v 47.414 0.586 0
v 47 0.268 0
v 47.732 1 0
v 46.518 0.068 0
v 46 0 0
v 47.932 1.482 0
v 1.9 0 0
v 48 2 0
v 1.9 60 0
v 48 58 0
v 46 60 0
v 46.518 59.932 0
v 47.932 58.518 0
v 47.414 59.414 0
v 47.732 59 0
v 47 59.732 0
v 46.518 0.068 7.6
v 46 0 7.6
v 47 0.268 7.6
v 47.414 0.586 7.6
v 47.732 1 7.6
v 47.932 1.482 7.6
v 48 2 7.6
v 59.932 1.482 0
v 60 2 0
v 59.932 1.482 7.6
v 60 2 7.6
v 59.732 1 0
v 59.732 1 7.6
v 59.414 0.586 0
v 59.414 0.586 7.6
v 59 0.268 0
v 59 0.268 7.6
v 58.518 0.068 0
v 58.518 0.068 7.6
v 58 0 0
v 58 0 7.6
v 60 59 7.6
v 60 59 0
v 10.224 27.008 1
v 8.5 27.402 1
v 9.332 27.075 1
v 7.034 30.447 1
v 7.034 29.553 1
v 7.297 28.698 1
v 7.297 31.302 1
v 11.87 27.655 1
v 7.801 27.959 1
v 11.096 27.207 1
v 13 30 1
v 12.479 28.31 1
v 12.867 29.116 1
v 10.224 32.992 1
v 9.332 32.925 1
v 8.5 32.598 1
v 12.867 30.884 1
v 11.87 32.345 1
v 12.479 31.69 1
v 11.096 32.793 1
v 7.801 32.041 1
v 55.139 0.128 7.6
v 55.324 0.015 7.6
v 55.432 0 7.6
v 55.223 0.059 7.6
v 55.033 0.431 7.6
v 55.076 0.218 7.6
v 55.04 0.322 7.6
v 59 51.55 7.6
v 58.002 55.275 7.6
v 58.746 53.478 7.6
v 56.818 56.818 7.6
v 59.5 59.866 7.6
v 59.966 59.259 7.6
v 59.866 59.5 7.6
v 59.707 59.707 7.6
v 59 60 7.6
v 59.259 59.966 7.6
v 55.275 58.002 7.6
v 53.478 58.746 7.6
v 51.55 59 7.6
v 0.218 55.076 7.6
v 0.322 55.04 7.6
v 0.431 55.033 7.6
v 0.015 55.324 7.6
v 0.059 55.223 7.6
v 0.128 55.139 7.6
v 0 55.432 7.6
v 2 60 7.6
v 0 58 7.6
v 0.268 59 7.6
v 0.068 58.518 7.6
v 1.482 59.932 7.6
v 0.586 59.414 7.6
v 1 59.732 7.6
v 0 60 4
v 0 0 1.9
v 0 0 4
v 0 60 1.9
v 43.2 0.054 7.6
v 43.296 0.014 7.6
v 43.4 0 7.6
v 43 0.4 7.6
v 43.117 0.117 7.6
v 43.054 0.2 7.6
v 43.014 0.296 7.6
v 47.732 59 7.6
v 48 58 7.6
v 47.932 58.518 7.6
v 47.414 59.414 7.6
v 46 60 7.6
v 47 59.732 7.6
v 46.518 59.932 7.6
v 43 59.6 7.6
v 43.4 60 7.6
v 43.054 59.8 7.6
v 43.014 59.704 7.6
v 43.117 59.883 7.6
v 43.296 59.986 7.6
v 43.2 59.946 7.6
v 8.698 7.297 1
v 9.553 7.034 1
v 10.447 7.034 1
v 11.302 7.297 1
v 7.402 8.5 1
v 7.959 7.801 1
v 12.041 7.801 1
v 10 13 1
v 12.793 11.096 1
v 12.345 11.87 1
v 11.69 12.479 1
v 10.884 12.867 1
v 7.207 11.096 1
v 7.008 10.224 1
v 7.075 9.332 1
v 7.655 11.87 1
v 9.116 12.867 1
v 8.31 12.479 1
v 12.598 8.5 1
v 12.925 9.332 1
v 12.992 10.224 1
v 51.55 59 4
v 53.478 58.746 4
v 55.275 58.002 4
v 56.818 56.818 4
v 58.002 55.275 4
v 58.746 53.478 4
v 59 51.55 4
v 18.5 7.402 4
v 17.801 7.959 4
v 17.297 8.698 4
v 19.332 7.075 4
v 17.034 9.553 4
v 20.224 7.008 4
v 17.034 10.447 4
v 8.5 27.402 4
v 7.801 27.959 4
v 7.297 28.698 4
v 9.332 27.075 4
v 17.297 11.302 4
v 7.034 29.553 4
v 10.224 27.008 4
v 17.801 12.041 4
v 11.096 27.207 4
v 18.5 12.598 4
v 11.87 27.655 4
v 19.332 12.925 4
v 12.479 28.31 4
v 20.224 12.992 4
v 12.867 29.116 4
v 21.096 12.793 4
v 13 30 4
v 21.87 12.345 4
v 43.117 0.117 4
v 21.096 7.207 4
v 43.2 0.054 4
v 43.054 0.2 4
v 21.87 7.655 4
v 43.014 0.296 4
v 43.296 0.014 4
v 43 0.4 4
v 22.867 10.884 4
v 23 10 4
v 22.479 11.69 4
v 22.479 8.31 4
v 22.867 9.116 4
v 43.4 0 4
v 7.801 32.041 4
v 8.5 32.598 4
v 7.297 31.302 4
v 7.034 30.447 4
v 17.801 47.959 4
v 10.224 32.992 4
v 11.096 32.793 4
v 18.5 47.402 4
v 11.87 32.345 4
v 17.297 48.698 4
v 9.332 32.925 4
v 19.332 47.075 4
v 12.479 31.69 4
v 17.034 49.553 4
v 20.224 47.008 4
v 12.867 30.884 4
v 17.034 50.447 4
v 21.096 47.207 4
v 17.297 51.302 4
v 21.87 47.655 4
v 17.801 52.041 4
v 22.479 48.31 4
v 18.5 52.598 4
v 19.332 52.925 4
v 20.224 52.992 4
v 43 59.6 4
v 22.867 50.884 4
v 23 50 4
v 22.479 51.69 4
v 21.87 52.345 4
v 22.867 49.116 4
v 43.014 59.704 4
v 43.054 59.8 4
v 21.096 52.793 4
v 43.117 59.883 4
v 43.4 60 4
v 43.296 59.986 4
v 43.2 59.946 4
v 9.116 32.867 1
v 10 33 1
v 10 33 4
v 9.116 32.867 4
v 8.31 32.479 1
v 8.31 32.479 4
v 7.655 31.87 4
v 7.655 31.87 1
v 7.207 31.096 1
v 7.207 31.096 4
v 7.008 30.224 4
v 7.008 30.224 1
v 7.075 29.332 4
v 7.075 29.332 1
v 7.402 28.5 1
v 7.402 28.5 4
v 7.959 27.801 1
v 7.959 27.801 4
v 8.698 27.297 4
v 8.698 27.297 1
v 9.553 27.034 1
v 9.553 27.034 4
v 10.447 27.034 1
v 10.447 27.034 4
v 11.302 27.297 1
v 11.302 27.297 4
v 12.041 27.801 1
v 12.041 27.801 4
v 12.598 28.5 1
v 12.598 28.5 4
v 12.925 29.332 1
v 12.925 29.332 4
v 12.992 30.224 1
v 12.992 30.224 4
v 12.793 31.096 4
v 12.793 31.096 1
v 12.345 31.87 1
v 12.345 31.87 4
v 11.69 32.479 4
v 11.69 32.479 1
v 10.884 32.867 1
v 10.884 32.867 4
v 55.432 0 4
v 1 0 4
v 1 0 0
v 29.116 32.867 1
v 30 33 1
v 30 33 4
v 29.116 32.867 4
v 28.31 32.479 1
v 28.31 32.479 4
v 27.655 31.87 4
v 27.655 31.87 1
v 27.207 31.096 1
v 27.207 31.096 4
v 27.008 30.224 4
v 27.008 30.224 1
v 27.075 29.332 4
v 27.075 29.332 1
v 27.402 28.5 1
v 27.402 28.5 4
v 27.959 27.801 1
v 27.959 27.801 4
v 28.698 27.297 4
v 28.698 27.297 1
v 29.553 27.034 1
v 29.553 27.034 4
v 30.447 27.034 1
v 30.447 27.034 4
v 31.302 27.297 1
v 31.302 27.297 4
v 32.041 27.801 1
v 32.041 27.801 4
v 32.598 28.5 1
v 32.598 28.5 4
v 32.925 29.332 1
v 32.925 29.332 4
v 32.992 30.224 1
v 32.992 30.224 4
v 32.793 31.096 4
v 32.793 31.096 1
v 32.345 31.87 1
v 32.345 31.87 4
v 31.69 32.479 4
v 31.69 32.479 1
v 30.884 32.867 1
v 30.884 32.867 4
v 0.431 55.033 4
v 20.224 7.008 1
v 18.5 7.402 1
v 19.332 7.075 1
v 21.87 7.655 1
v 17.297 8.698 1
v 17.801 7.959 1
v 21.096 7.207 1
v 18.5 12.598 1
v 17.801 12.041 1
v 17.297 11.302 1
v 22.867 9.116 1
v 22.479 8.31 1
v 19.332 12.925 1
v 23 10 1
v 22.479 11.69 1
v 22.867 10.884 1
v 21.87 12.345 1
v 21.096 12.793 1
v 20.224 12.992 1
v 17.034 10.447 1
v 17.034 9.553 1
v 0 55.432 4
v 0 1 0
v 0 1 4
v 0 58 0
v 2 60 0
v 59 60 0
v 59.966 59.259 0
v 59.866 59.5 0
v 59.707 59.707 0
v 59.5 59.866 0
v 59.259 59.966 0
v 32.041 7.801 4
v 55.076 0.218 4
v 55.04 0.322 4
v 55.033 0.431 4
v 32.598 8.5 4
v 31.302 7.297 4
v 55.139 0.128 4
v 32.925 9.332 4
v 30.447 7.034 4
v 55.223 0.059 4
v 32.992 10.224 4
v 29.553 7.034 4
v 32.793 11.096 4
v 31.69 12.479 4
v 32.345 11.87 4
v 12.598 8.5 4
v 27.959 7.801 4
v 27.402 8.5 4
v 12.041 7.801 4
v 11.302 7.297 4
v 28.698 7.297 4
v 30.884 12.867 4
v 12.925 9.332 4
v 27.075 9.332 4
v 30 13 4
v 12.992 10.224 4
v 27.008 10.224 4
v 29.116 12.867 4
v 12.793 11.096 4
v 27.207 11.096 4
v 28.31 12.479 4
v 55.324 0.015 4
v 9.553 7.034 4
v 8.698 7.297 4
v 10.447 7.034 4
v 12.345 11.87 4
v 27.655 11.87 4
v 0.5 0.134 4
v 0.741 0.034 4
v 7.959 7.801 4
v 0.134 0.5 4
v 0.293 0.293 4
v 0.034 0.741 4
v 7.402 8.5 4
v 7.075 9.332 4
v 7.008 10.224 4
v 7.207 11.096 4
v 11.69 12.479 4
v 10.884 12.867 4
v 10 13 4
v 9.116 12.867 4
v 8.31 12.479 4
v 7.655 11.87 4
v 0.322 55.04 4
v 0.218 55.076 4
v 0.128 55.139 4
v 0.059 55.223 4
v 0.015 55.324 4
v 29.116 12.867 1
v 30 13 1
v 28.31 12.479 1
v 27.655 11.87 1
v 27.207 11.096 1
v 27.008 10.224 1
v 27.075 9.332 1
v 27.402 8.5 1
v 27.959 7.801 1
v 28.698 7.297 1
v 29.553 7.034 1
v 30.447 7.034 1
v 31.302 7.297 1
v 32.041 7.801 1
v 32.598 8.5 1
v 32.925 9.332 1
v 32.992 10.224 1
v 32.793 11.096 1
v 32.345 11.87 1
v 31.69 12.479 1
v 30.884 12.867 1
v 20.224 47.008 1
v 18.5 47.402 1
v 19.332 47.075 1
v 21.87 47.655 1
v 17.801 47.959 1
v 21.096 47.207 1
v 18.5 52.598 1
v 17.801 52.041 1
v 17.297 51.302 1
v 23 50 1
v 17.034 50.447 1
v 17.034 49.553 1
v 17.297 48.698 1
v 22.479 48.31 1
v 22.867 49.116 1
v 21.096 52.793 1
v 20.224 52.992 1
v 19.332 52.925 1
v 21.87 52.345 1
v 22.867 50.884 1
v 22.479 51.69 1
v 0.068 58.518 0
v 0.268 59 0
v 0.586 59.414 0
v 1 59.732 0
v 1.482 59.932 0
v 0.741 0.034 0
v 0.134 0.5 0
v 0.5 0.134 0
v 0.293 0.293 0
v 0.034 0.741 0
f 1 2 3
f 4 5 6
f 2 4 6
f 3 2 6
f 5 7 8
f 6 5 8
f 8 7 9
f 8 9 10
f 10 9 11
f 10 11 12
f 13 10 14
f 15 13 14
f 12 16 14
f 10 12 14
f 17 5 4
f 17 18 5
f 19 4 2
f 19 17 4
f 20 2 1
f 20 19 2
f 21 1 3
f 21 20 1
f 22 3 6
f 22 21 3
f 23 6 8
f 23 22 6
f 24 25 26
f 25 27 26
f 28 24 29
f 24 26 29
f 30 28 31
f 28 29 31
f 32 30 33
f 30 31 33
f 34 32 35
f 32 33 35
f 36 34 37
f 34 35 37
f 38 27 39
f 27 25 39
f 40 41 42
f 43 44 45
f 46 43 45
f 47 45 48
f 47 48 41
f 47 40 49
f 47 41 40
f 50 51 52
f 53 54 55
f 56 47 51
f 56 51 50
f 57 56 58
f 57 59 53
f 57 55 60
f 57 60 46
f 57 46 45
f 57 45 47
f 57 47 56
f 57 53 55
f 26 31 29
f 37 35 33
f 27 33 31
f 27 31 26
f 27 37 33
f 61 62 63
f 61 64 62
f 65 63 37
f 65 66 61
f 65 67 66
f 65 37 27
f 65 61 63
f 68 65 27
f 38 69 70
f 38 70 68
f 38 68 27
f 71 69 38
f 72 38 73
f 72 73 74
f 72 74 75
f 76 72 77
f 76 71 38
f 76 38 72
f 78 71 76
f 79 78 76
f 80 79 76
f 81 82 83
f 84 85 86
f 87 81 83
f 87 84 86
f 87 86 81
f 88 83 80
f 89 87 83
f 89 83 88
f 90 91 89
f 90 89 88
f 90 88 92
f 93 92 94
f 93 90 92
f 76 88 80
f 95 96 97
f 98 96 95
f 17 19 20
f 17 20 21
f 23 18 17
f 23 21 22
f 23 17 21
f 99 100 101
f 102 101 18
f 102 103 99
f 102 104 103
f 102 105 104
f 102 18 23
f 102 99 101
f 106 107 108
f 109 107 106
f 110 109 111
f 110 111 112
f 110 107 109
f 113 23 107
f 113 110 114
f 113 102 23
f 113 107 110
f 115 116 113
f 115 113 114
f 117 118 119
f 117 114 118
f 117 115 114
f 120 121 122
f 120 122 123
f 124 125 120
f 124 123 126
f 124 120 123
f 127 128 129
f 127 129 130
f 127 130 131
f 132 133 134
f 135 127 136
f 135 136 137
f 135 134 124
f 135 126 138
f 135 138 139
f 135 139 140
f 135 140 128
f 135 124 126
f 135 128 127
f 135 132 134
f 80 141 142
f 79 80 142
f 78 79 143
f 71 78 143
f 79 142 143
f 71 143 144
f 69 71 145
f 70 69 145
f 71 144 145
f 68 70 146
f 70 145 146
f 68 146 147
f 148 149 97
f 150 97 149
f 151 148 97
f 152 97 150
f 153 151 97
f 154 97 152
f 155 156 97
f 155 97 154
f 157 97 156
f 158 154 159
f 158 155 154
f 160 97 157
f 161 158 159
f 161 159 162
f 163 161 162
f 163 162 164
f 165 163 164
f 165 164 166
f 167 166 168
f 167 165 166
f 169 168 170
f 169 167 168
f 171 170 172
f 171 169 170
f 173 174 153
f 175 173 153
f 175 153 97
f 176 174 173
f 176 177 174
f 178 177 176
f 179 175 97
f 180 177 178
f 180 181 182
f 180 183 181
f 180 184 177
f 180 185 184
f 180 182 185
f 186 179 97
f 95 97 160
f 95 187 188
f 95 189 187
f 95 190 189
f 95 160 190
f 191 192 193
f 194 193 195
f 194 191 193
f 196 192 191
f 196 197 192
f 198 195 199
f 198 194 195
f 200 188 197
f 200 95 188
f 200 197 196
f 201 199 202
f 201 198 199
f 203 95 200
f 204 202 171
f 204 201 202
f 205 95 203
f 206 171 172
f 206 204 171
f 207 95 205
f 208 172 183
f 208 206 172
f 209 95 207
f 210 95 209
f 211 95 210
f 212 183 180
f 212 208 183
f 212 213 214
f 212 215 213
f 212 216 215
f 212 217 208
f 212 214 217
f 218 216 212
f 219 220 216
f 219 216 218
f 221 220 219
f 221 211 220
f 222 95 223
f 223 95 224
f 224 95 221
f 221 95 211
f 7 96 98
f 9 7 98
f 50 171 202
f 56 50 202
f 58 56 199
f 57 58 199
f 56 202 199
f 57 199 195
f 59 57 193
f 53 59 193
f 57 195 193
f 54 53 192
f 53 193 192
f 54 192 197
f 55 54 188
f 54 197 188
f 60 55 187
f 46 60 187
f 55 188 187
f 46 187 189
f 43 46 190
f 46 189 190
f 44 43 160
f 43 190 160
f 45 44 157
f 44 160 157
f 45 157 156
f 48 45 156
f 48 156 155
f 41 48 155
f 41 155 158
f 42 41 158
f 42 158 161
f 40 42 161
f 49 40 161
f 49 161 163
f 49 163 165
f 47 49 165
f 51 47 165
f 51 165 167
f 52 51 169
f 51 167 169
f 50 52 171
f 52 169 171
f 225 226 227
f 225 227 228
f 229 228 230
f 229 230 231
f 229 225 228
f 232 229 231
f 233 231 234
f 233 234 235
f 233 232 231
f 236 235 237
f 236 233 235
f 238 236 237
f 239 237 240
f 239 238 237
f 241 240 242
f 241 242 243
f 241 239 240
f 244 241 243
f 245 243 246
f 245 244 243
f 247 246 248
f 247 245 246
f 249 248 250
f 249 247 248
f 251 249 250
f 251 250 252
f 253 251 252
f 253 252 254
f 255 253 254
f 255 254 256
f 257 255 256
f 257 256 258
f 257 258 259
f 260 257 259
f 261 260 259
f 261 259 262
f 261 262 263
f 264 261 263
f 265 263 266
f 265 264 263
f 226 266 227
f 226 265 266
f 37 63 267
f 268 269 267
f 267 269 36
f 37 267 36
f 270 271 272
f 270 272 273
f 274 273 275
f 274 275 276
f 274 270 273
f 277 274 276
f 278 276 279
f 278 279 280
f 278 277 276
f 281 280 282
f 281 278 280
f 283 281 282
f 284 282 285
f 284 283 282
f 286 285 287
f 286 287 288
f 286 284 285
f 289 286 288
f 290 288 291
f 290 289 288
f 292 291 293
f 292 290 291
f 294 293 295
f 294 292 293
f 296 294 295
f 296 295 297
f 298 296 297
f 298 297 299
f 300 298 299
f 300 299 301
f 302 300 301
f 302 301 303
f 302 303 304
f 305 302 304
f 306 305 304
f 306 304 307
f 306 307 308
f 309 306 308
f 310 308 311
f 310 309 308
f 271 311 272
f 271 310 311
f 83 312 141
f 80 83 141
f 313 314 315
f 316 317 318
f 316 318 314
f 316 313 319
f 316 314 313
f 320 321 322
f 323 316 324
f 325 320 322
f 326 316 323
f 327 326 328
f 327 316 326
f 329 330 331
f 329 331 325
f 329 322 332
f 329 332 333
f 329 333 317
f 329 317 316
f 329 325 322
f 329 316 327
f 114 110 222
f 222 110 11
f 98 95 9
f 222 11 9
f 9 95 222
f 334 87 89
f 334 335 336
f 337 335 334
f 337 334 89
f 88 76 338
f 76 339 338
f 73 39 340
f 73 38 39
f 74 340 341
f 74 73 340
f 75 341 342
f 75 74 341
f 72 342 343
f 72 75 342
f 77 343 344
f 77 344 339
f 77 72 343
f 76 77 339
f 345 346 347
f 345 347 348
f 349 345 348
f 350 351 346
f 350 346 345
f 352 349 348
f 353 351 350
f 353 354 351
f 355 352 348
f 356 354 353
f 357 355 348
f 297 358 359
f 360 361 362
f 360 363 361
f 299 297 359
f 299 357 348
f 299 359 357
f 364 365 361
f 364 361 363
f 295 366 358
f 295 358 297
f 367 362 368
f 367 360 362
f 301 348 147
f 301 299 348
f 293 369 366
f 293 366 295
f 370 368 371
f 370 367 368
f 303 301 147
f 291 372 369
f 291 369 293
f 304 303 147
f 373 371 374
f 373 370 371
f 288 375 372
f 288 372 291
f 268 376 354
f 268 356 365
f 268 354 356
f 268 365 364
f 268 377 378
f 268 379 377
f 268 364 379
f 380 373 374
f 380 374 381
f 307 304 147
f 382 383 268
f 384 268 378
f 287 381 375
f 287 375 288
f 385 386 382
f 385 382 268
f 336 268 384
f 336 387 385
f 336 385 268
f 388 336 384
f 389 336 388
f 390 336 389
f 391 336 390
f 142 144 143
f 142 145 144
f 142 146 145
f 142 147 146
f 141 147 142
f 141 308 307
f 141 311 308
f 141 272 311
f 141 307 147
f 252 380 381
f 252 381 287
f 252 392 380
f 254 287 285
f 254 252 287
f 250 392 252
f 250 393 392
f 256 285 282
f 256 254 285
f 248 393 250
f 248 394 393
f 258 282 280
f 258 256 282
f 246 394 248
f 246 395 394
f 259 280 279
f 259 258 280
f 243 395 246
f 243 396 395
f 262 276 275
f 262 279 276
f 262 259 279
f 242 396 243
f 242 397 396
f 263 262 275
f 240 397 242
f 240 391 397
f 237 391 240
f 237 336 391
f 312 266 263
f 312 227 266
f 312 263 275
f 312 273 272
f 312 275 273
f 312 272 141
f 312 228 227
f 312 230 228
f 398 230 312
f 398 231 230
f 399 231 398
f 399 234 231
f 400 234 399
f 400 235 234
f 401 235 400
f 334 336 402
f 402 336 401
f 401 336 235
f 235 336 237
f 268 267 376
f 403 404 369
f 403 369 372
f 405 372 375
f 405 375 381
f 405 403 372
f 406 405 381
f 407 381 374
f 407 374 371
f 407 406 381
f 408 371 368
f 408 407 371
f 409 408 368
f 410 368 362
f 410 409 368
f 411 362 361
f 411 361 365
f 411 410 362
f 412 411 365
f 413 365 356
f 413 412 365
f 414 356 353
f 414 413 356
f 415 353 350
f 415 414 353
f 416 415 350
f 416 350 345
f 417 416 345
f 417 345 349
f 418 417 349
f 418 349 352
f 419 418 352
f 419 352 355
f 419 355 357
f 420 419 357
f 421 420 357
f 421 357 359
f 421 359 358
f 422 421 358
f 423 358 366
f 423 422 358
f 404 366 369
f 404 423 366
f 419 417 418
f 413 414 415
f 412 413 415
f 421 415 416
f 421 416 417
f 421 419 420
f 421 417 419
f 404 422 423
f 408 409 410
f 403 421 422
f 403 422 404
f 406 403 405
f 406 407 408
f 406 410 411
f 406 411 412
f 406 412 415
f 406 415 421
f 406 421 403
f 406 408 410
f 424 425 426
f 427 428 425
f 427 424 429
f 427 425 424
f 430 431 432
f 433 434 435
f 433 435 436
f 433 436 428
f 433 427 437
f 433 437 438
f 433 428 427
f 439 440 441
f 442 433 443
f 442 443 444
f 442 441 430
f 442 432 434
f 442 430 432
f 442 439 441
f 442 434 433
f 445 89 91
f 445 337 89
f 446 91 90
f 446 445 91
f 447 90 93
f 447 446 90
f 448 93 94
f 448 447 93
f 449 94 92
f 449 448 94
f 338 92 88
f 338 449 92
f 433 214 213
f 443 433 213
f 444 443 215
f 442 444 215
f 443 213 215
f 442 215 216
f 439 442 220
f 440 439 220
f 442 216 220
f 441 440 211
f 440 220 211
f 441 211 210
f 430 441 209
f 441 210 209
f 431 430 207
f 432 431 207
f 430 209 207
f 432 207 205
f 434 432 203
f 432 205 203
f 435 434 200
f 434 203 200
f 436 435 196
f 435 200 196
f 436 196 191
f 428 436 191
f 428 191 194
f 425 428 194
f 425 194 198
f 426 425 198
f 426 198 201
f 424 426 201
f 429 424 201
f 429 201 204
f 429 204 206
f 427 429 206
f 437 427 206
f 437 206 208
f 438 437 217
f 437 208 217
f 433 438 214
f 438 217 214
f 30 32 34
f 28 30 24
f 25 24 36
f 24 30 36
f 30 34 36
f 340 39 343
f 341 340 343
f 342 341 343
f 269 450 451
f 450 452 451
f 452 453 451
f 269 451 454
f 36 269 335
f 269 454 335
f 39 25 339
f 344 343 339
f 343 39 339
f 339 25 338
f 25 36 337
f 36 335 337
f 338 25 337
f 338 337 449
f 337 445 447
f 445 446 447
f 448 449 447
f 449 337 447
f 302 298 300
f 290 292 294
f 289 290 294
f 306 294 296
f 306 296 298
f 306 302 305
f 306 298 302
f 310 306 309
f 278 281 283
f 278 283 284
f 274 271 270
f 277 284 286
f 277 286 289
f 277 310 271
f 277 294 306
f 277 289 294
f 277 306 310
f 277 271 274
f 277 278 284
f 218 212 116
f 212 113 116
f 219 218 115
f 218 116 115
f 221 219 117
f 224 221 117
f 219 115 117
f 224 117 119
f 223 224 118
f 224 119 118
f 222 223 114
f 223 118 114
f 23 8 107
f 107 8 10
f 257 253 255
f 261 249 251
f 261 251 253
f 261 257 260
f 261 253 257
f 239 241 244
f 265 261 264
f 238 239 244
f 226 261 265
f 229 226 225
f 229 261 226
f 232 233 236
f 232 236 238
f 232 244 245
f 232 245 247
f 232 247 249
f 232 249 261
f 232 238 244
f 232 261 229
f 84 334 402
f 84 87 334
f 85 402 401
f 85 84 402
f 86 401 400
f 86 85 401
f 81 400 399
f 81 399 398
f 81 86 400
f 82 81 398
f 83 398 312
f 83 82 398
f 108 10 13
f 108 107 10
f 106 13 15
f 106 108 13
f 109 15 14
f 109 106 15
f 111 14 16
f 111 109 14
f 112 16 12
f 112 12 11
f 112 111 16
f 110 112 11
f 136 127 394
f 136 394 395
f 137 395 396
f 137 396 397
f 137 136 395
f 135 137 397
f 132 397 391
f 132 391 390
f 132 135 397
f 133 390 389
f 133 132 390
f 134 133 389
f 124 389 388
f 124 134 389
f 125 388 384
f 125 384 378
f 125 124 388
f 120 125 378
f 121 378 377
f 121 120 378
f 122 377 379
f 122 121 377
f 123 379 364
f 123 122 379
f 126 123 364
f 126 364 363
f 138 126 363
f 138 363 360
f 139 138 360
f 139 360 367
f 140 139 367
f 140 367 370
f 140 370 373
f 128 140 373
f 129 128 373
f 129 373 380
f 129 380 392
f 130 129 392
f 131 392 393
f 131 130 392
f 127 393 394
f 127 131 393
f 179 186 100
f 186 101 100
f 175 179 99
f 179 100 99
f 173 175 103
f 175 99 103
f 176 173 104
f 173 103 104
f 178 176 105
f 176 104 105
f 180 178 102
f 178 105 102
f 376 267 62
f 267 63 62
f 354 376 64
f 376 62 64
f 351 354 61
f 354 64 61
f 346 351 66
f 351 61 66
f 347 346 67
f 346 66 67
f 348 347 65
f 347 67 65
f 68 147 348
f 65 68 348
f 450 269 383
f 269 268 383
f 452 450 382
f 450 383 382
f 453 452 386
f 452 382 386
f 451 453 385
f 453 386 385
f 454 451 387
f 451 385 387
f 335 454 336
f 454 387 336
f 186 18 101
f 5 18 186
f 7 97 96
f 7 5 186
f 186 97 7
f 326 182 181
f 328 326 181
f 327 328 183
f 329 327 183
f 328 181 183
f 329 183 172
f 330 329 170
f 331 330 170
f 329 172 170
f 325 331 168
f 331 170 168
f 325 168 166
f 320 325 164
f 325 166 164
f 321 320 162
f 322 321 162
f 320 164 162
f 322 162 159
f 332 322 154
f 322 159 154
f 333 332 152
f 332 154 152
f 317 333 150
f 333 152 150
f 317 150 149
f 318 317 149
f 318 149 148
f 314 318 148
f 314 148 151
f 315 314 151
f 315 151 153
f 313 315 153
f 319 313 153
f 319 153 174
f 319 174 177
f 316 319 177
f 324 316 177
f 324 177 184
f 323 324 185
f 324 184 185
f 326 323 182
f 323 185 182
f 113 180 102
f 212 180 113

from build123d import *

# Parameters (mm, degrees)
FACE002_W        = 60
FACE002_H        = 5
EXTRUDE002_DEPTH = 3.6
SKETCH001_R      = 3
EXTRUDE001_DEPTH = 3
SKETCH_W         = 48
SKETCH_H         = 60
EXTRUDE_DEPTH    = 4
FILLET_R         = 2
FILLET001_R      = 0.4
CHAMFER_SIZE     = 1.9
EXTRUDE005_DEPTH = 3.6
FACE004_R        = 3
EXTRUDE004_DEPTH = 3
FACE003_W        = 60
FACE003_H        = 60
EXTRUDE003_DEPTH = 4
FILLET002_1_R    = 2
FILLET002_2_R    = 1
FILLET003_R      = 0.4


with BuildPart() as extrude002:
    # Face002 → Extrude002 (new body)
    with BuildSketch(Plane(origin=(45.5, 30, 4), x_dir=(0, 1, 0), z_dir=(0, 0, 1))):
        Rectangle(FACE002_W, FACE002_H)
    extrude(amount=EXTRUDE002_DEPTH)


with BuildPart() as extrude001:
    # Sketch001 (on Face6 of Extrude) → Extrude001 (new body)
    with BuildSketch(Plane.XY.offset(4)):
        with Locations((20, 50)):
            Circle(SKETCH001_R)
        with Locations((20, 10)):
            Circle(SKETCH001_R)
        with Locations((10, 30)):
            Circle(SKETCH001_R)
    extrude(amount=-EXTRUDE001_DEPTH)


with BuildPart() as straight:
    # Sketch → Extrude (new body)
    with BuildSketch(Plane.XY):
        with Locations((24, 30)):
            Rectangle(SKETCH_W, SKETCH_H)
    extrude(amount=EXTRUDE_DEPTH)

    # Cut: cut Extrude001
    add(extrude001.part, mode=Mode.SUBTRACT)

    # Fusion: union Extrude002
    add(extrude002.part)

    # Fillet
    fillet_edges = [straight.edges().sort_by_distance(p)[0] for p in [
        (48, 60, 5.8),
        (48, 0, 5.8),
        (48, 60, 2),
        (48, 0, 2),
    ]]
    fillet(fillet_edges, radius=FILLET_R)

    # Fillet001
    fillet001_edges = [straight.edges().sort_by_distance(p)[0] for p in [
        (43, 60, 5.8),
        (43, 0, 5.8),
    ]]
    fillet(fillet001_edges, radius=FILLET001_R)

    # Chamfer
    chamfer_edges = [straight.edges().sort_by_distance(p)[0] for p in [
        (0, 30, 0),
    ]]
    chamfer(chamfer_edges, length=CHAMFER_SIZE)


with BuildPart() as extrude005:
    # Face005 → Extrude005 (new body)
    with BuildSketch(Plane(origin=(40.670446, 40.670446, 4), x_dir=(0, 1, 0), z_dir=(0, 0, 1))):
        with BuildLine():
            Line((10.879807, -18.329554), (-40.670446, -14.329554))
            Line((-40.670446, -14.329554), (-40.670446, -19.329554))
            Line((-40.670446, -19.329554), (19.329554, -19.329554))
            Line((19.329554, -19.329554), (19.329554, 40.670446))
            Line((19.329554, 40.670446), (14.329554, 40.670446))
            Line((14.329554, 40.670446), (18.329554, -10.879807))
            ThreePointArc((18.329554, -10.879807), (16.147574, -16.147574), (10.879807, -18.329554))
        make_face()
    extrude(amount=EXTRUDE005_DEPTH)


with BuildPart() as extrude004:
    # Face004 → Extrude004 (new body)
    with BuildSketch(Plane(origin=(30, 10, 0), x_dir=(0, 1, 0), z_dir=(0, 0, 1))):
        Circle(FACE004_R)
        with Locations((20, 0)):
            Circle(FACE004_R)
        with Locations((20, 20)):
            Circle(FACE004_R)
        with Locations((0, 20)):
            Circle(FACE004_R)
    extrude(amount=EXTRUDE004_DEPTH)


with BuildPart() as extrude004_1:
    # Extrude004 placement: moved
    add(extrude004.part.moved(Location((0, 0, 1))))


with BuildPart() as corner:
    # Face003 → Extrude003 (new body)
    with BuildSketch(Plane(origin=(30, 30, 0), x_dir=(0, 1, 0), z_dir=(0, 0, 1))):
        Rectangle(FACE003_W, FACE003_H)
    extrude(amount=EXTRUDE003_DEPTH)

    # Cut001: cut Extrude004
    add(extrude004_1.part, mode=Mode.SUBTRACT)

    # Fusion001: union Extrude005
    add(extrude005.part)

    # Fillet002 1
    fillet002_1_edges = [corner.edges().sort_by_distance(p)[0] for p in [
        (60, 0, 5.8),
        (60, 0, 2),
        (0, 60, 2),
        (0, 60, 5.8),
    ]]
    fillet(fillet002_1_edges, radius=FILLET002_1_R)

    # Fillet002 2
    fillet002_2_edges = [corner.edges().sort_by_distance(p)[0] for p in [
        (60, 60, 5.8),
        (0, 0, 2),
        (60, 60, 2),
    ]]
    fillet(fillet002_2_edges, radius=FILLET002_2_R)

    # Fillet003
    fillet003_edges = [corner.edges().sort_by_distance(p)[0] for p in [
        (55, 0, 5.8),
        (0, 55, 5.8),
    ]]
    fillet(fillet003_edges, radius=FILLET003_R)


solid = Compound([straight.part, corner.part])
